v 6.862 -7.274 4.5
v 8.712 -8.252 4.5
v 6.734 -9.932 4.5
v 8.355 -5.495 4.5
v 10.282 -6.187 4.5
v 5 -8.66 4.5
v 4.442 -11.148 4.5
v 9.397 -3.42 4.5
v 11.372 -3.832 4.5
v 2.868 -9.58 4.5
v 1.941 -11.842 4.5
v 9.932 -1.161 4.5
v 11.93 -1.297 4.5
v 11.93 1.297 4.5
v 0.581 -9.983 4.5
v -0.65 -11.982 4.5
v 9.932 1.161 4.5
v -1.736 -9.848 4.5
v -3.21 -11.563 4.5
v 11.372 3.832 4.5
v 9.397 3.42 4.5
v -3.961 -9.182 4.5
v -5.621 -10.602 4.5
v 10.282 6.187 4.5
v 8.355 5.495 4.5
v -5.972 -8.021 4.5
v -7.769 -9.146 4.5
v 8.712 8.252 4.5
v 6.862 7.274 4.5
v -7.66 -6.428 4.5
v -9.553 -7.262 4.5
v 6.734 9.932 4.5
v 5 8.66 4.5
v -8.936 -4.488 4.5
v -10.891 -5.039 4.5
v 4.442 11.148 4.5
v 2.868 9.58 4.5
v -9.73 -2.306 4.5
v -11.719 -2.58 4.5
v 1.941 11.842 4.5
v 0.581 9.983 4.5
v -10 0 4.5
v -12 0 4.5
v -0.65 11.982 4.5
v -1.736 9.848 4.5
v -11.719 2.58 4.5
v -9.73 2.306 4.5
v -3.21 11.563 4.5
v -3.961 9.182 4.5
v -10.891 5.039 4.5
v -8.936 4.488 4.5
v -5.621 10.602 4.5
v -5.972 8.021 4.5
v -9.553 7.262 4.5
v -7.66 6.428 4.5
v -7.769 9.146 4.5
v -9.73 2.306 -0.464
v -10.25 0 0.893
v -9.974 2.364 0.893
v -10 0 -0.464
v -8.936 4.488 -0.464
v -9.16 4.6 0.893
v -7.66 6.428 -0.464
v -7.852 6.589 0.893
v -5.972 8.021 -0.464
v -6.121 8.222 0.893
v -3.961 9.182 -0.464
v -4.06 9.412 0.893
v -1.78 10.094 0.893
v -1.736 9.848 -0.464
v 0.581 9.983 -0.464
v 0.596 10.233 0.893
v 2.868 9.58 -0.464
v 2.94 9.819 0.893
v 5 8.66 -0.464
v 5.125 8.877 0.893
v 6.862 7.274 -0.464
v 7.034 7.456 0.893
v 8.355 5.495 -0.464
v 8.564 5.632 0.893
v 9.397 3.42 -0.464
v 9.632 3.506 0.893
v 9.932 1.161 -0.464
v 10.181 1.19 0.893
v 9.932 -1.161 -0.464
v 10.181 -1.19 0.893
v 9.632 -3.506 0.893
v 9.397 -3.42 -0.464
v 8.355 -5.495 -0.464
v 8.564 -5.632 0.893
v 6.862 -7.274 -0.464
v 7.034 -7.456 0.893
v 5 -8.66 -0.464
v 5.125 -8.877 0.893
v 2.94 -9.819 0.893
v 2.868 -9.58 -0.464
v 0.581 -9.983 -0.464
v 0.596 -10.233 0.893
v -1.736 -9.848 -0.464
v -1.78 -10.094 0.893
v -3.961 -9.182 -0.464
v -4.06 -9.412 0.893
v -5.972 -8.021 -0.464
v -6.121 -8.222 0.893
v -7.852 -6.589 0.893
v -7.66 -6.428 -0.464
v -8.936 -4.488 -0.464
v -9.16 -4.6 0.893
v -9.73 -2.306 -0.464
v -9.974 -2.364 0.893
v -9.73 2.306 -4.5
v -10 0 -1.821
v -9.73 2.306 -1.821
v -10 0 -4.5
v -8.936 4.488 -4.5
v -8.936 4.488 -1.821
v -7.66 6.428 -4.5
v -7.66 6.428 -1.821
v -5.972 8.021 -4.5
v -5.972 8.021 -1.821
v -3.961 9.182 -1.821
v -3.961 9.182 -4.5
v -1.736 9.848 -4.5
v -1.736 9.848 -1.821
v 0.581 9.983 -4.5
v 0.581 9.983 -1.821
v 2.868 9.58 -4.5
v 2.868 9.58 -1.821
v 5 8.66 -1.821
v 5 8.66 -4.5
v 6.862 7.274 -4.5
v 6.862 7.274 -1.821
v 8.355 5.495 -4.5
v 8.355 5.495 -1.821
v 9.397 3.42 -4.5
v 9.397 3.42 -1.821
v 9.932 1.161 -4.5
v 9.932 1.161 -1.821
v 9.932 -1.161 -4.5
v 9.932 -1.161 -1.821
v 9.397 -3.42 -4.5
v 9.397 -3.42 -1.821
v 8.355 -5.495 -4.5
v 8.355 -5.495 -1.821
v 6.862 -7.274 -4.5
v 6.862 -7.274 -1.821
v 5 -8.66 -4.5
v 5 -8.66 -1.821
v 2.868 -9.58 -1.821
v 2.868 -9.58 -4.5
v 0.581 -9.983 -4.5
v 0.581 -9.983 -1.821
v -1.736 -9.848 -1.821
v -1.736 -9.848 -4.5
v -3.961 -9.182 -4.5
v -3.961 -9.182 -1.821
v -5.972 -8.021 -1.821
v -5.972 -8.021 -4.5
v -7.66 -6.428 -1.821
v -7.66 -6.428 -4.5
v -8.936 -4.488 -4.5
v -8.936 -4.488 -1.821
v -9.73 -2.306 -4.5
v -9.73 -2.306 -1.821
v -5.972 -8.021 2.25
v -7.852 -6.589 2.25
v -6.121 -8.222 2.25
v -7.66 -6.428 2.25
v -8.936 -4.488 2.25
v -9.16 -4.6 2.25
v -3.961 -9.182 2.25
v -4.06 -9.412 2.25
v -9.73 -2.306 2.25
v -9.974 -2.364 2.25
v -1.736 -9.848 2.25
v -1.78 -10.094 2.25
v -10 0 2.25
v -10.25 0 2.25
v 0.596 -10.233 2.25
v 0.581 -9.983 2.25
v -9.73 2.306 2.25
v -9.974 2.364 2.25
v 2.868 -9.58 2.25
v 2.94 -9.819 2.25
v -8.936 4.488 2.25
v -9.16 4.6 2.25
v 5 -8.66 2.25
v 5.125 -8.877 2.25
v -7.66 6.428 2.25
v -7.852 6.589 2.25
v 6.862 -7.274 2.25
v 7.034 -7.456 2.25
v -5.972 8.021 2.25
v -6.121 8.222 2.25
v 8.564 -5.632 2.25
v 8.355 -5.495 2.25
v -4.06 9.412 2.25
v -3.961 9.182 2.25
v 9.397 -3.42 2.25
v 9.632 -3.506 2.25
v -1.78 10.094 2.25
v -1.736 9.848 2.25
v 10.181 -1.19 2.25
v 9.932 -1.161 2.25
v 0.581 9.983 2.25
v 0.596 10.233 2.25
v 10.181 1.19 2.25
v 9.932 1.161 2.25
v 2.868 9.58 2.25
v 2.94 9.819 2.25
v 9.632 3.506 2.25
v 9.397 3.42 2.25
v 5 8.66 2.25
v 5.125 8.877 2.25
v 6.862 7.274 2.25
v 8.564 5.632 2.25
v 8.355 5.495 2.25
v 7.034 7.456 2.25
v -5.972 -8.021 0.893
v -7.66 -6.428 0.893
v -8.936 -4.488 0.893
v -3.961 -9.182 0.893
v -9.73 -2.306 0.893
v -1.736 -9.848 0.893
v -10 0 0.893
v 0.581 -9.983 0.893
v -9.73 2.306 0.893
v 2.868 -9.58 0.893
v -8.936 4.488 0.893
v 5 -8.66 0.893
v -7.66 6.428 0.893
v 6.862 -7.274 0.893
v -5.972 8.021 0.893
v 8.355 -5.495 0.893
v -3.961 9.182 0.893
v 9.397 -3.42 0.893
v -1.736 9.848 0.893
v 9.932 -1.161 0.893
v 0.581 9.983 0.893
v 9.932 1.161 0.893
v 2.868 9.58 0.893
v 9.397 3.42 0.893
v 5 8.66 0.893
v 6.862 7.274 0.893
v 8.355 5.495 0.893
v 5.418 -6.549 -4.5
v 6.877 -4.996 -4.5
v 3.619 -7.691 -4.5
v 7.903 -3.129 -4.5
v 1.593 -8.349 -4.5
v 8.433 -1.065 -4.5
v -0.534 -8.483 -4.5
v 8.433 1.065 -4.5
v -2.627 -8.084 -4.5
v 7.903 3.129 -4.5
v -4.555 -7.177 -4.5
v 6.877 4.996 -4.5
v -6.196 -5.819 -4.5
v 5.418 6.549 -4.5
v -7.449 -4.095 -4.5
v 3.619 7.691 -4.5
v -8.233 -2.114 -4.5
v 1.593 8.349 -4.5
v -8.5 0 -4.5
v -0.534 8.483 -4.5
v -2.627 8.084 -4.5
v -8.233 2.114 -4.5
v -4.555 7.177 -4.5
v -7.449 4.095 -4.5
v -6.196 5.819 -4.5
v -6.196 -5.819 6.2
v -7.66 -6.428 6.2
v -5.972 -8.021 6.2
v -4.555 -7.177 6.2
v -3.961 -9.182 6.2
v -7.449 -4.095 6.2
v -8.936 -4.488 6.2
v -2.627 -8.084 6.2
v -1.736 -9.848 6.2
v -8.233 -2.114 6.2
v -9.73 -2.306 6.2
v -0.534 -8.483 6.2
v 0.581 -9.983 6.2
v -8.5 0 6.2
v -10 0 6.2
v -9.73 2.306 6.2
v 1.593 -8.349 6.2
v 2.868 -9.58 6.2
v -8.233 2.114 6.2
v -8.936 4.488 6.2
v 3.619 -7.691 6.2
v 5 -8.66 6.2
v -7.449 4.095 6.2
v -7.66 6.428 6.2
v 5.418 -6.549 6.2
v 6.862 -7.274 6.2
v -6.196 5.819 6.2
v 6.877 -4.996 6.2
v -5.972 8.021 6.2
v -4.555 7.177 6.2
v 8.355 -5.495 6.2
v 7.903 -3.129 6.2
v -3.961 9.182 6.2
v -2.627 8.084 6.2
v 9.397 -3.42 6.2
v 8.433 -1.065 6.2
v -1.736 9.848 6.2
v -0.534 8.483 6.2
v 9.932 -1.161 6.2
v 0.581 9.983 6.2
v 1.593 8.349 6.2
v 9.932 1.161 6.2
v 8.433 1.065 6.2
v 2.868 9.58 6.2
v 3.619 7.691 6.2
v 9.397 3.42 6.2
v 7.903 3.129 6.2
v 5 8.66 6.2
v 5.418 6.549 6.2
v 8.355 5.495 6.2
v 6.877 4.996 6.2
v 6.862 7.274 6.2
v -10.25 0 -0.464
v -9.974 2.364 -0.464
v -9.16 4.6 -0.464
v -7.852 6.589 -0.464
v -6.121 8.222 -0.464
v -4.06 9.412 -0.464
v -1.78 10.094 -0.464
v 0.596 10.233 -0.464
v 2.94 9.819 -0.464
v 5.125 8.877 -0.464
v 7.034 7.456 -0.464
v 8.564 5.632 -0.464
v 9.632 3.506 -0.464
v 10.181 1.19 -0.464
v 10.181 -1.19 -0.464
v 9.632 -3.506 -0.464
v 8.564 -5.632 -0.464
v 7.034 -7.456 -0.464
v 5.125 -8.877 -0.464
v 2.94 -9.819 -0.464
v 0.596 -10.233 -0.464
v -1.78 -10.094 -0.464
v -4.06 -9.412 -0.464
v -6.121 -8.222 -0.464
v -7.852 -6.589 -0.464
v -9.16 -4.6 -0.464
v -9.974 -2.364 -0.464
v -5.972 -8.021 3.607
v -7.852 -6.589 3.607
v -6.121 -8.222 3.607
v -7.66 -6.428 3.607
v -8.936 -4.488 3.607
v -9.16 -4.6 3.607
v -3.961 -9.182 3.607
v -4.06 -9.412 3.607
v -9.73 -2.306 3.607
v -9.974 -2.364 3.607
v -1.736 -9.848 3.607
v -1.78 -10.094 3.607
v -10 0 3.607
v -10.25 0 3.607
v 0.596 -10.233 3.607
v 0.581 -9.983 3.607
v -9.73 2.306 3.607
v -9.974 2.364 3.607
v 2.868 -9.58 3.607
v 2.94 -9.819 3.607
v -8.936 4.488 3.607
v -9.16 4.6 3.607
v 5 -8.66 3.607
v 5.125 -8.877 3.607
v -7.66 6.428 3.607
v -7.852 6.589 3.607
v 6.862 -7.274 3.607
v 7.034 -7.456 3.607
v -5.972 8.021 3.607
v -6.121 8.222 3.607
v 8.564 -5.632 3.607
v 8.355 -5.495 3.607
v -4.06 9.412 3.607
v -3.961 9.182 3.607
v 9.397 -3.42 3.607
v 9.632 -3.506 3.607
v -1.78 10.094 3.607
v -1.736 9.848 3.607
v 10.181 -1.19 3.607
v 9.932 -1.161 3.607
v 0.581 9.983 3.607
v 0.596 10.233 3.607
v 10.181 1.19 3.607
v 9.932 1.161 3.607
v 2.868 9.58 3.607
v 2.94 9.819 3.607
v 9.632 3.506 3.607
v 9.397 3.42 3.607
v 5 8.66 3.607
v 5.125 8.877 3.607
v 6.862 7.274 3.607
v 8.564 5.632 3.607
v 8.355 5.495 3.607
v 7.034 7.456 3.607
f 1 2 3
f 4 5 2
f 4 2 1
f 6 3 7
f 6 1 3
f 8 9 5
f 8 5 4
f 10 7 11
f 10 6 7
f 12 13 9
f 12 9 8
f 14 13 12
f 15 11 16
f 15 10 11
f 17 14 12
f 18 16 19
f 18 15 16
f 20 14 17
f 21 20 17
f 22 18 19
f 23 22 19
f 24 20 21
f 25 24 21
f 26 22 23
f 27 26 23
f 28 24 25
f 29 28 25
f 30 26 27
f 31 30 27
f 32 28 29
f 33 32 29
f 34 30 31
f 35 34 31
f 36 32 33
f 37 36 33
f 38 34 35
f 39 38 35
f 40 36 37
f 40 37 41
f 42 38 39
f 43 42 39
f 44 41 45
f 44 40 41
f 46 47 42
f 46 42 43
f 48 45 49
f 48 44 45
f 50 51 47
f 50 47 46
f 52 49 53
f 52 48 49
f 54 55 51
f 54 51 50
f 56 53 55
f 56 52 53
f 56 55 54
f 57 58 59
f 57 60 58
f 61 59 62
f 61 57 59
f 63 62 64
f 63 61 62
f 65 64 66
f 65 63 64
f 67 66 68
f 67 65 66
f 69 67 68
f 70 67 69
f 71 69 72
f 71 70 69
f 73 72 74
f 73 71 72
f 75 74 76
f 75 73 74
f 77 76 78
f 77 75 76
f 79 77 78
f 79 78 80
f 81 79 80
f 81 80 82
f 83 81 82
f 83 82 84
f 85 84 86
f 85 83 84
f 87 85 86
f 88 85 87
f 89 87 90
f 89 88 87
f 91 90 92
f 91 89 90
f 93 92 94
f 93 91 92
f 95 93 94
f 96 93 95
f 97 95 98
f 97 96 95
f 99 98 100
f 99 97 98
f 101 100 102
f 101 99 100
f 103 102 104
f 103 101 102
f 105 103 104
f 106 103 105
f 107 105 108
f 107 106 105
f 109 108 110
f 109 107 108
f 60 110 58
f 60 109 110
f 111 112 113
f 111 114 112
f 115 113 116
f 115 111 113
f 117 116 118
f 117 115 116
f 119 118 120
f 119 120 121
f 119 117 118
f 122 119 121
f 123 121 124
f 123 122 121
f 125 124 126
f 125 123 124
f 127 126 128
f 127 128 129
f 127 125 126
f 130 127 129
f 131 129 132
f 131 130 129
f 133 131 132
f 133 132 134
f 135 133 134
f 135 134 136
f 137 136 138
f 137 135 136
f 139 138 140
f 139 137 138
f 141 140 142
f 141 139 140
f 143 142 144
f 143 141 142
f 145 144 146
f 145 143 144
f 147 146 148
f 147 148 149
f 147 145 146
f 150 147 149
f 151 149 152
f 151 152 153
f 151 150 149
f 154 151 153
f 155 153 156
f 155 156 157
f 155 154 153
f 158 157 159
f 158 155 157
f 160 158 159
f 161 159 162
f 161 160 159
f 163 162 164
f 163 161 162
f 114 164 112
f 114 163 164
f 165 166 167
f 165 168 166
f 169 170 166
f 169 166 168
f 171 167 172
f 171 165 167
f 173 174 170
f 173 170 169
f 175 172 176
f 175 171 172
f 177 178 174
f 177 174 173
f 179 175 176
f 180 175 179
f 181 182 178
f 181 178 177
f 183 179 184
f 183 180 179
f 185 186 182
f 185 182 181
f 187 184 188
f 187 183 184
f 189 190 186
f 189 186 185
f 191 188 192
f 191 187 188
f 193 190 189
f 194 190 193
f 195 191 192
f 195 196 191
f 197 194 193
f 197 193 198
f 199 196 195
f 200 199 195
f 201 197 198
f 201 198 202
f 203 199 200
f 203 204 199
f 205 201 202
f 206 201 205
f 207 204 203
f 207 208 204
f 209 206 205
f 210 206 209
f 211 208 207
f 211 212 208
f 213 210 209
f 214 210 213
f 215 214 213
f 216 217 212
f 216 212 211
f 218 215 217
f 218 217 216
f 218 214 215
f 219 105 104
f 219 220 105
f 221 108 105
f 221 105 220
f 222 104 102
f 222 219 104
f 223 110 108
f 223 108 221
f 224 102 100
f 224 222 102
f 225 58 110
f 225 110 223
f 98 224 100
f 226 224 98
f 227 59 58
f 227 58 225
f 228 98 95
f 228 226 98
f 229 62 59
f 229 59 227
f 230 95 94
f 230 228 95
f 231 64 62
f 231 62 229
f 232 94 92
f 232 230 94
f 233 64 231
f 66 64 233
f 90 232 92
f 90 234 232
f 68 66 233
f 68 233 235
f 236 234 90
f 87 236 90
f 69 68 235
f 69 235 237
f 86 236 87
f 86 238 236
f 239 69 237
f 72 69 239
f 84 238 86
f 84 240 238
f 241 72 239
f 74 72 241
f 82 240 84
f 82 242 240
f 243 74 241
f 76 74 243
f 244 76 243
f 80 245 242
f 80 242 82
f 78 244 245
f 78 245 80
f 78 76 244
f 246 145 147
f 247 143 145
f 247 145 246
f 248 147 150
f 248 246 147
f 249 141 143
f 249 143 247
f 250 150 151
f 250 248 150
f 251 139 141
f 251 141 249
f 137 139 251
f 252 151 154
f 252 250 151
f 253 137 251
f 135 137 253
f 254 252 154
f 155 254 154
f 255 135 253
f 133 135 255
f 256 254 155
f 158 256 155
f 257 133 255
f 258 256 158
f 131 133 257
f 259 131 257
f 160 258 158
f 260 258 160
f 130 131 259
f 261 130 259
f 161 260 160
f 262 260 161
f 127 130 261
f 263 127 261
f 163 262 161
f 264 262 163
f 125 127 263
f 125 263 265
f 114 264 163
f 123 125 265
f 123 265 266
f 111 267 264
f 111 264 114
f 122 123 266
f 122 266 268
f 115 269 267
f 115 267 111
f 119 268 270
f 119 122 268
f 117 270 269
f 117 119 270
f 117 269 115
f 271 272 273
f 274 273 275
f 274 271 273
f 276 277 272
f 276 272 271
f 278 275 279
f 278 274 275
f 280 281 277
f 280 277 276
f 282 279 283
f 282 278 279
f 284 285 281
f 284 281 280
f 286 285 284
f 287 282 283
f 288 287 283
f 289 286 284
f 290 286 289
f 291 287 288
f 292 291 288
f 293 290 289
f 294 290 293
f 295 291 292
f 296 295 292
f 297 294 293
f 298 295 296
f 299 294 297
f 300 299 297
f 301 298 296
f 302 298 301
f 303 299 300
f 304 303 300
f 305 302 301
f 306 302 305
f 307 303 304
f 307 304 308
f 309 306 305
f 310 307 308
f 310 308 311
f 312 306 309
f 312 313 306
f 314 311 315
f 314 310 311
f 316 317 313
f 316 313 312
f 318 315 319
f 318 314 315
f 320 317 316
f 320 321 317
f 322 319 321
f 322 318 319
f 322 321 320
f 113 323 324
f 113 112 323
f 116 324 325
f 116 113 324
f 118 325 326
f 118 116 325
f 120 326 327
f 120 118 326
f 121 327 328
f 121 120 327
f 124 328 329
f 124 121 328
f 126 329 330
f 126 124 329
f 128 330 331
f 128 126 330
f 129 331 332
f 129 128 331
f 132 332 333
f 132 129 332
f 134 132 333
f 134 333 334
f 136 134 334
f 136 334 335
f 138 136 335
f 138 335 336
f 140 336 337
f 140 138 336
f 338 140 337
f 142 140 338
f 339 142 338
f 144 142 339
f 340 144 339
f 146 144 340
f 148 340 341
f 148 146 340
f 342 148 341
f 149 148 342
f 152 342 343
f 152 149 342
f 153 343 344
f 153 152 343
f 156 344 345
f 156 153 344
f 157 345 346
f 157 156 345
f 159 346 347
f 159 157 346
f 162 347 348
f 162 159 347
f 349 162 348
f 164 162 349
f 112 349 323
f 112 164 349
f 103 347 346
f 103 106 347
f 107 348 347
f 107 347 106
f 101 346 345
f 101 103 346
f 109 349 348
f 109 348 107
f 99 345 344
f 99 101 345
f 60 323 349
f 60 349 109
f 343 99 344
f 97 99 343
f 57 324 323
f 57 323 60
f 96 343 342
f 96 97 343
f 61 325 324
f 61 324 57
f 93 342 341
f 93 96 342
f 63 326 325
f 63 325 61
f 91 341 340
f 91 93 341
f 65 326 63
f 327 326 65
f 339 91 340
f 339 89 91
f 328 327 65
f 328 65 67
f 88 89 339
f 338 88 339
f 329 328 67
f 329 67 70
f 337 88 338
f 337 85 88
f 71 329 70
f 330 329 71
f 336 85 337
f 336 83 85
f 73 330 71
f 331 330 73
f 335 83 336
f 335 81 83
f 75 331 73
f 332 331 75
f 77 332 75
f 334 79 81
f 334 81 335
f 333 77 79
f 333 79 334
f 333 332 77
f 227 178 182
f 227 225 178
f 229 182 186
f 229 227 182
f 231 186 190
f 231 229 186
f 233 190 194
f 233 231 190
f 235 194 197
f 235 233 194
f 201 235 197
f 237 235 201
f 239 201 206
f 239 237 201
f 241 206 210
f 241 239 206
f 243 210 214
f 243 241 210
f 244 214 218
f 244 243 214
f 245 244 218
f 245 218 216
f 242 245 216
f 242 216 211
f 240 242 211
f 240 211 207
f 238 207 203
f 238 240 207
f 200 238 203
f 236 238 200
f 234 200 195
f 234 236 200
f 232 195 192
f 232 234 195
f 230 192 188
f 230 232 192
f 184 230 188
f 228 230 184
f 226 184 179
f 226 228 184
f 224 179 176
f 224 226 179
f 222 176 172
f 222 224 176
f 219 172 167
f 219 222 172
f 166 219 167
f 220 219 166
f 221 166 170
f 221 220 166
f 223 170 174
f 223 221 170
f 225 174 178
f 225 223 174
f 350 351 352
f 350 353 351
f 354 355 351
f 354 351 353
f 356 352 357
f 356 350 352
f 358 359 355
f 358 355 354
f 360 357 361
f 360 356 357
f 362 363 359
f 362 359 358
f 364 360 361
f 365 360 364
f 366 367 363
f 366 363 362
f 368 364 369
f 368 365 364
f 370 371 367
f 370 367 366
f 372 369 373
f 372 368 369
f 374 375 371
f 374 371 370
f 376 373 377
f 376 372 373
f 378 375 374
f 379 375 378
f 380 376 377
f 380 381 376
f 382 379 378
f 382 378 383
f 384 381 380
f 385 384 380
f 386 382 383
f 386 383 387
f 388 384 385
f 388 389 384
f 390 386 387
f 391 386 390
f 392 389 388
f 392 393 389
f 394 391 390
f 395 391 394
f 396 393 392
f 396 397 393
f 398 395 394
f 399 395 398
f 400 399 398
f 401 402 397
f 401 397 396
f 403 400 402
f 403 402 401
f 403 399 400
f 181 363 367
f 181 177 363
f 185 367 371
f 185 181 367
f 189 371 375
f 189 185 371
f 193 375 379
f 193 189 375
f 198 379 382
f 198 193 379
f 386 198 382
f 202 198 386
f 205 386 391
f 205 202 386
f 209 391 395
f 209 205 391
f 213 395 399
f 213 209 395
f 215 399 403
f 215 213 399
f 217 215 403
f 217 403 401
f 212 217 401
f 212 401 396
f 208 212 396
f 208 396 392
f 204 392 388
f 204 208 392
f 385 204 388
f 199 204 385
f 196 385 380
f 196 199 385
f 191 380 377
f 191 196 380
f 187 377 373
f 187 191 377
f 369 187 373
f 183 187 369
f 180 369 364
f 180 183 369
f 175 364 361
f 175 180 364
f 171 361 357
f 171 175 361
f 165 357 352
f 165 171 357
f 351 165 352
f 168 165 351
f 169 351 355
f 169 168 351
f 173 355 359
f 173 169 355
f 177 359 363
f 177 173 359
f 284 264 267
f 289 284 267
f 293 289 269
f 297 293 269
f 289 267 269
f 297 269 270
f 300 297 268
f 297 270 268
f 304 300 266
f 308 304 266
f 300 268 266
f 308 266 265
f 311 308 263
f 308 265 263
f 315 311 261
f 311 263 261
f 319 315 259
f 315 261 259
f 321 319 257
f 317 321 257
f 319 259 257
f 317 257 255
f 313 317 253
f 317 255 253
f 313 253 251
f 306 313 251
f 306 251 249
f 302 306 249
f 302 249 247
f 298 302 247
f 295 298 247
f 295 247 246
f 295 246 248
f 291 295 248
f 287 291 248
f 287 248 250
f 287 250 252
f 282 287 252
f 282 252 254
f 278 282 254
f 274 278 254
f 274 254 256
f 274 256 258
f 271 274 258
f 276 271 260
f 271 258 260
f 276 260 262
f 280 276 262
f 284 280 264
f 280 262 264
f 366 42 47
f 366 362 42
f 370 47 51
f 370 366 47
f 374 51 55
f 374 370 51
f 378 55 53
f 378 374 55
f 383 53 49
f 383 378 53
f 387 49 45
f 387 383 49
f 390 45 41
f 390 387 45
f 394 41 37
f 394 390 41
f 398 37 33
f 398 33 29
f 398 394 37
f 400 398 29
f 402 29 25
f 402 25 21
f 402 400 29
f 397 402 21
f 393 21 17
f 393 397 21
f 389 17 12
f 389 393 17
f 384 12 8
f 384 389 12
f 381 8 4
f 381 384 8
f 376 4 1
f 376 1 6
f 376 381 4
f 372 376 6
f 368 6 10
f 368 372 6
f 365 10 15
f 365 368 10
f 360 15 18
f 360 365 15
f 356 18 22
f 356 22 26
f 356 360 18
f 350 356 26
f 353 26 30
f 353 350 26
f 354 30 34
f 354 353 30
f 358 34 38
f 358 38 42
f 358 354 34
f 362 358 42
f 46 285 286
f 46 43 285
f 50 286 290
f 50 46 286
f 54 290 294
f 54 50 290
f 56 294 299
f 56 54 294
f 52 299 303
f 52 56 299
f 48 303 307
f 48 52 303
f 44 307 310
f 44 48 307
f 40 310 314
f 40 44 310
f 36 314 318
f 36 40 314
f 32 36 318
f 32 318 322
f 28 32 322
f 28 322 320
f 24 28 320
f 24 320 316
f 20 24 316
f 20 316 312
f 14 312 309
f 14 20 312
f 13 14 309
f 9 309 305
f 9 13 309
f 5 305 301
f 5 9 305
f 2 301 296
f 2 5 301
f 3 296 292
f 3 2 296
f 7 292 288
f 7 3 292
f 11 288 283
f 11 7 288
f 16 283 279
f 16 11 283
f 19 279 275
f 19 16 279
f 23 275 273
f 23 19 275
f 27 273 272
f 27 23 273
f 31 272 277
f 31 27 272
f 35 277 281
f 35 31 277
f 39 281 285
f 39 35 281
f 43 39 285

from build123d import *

# Parameters (mm, degrees)
F3_D = 17


with BuildPart() as f1:
    # F0 (on Front) → F1 (revolve)
    with BuildSketch(Plane.XZ):
        Polygon((-10, -1.820884), (-10, -4.5), (0, -4.5), (0, 6.2), (-10, 6.2), (-12, 4.5), (-10, 4.5), (-10, 3.607264), (-10.25, 3.607264), (-10, 2.250227), (-10.25, 2.250227), (-10, 0.89319), (-10.25, 0.89319), (-10, -0.463847), (-10.25, -0.463847), align=None)
    revolve(axis=Axis((0, 0, 0.85), (0, 0, -1)))

    # F3 (through all)
    with Locations(Plane.XY.offset(6.2)):
        with Locations((0, 0)):
            Hole(F3_D / 2)


solid = f1.part
